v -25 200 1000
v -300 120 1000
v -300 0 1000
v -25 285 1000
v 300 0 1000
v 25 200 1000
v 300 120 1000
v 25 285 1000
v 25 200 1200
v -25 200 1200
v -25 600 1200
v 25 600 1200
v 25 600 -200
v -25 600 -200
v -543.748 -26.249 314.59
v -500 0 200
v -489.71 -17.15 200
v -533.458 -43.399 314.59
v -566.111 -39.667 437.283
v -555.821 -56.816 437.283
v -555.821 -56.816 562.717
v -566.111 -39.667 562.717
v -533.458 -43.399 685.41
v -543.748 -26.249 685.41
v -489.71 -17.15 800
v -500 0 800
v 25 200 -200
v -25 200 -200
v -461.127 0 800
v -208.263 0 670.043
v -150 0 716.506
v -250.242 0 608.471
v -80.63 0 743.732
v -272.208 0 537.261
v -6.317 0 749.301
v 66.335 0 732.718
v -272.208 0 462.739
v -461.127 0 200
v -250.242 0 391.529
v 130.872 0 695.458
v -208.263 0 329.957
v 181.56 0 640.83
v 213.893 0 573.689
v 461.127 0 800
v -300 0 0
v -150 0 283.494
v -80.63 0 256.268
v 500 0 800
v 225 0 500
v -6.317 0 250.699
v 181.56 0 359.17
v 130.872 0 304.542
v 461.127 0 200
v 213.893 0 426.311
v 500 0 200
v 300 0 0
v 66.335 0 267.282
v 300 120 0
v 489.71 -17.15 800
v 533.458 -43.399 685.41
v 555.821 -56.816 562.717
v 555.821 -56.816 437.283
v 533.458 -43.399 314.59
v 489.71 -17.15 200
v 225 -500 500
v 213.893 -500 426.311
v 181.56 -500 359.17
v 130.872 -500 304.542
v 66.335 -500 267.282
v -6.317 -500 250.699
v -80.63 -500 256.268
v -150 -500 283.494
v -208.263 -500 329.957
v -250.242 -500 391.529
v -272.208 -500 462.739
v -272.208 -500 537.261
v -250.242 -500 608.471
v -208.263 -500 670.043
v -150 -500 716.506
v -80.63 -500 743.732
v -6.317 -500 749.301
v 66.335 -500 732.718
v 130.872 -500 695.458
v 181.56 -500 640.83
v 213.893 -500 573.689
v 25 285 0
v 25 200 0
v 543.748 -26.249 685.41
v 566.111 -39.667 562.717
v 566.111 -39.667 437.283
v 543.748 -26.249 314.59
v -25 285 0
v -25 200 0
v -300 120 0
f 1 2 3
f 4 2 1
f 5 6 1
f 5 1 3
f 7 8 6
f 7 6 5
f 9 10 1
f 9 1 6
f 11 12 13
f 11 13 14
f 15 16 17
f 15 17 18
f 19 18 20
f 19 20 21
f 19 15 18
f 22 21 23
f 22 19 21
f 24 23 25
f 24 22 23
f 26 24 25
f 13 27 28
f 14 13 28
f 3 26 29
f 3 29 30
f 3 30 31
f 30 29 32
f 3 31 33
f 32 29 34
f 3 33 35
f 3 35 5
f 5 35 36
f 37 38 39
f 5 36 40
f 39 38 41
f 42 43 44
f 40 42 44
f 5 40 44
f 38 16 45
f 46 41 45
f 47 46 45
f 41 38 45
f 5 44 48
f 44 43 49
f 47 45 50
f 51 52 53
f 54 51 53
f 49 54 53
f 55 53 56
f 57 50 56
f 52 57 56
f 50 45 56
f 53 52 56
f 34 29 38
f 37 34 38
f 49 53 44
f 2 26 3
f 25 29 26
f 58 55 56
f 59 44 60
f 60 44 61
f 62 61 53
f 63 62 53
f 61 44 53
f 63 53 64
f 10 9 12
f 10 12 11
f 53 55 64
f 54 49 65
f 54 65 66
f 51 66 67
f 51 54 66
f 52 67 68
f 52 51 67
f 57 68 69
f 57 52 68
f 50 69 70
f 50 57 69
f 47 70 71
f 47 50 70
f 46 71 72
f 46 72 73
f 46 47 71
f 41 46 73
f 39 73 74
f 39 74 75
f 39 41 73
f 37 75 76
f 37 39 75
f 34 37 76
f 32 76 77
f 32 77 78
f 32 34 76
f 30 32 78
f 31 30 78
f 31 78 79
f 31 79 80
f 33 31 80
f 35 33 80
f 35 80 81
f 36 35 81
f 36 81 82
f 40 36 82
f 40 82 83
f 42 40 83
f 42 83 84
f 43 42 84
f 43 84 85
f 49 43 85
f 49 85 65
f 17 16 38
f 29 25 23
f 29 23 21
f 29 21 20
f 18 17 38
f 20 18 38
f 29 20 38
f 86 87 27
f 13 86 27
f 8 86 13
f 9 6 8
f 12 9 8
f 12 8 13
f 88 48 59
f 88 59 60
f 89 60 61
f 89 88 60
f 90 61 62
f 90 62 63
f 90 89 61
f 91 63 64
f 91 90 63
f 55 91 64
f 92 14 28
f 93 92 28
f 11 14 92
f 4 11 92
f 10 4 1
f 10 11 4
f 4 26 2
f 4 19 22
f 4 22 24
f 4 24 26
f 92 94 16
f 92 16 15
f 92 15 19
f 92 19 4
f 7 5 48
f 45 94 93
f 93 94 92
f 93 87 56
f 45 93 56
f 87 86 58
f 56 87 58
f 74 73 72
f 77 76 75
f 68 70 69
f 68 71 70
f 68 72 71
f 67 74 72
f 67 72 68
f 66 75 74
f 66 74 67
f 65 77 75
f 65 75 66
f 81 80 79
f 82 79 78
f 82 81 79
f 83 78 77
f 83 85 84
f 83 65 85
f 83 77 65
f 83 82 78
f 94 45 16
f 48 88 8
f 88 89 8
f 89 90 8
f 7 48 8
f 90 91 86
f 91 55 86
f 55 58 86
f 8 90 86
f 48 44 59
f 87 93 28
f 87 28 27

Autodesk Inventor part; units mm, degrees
ref_plane "YZ Plane" through (0, 0, 0) normal (1, 0, 0) x (0, 1, 0)
ref_plane "XZ Plane" through (0, 0, 0) normal (0, 1, 0) x (-1, 0, 0)
ref_plane "XY Plane" through (0, 0, 0) normal (0, 0, 1) x (1, 0, 0)
sketch "Boceto1" plane through (0, 0, 0) normal (0, 0, 1) x (1, 0, 0)
  line L0 (0, 0) -> (-500, 0)
  line L1 (0, 0) -> (500, 0)
  line L2 (0, 0) -> (0, 300)
  line L3 (-500, 0) -> (0, 300)
  line L4 (500, 0) -> (0, 300)
  dimension "d0" = 500
  dimension "d1" = 500
  dimension "d2" = 300
extrude "Extrusión1" add sketch "Boceto1" along normal blind 1000
sketch "Boceto2" plane through (-500, 0, 0) normal (0, -1, 0) x (1, 0, 0)
  line L0 (0, 1000) -> (1000, 1000) projected
  line L1 (0, 1000) -> (0, 800)
  line L2 (0, 0) -> (0, 1000) projected
  line L3 (0, 800) -> (200, 1000)
  line L4 (200, 1000) -> (0, 1000)
  line L5 (1000, 1000) -> (800, 1000)
  line L6 (800, 1000) -> (1000, 800)
  line L7 (1000, 0) -> (1000, 1000) projected
  line L8 (1000, 800) -> (1000, 1000)
  line L9 (0, 0) -> (1000, 0) projected
  line L10 (0, 0) -> (0, 200)
  line L11 (200, 0) -> (0, 0)
  line L12 (200, 0) -> (0, 200)
  line L13 (1000, 0) -> (800, 0)
  line L14 (800, 0) -> (1000, 0)
  line L15 (1000, 200) -> (800, 0)
  point P0 (500, 0)
  dimension "d5" = 200
  dimension "d6" = 45
  dimension "d7" = 200
  dimension "d8" = 45
extrude "Extrusión2" cut sketch "Boceto2" against normal blind 1000 contours L0 L3 L1 | L0 L7 L6 | L12 L9 L2 | L7 L9 L15
sketch "Boceto3" plane through (0, 300, 1000) normal (0.5145, 0.8575, 0) x (0.8575, -0.5145, 0)
  line L0 (583.0952, 800) -> (583.0952, 200) projected
  arc A0 (583.0952, 200) -> (583.0952, 800) centre (63.4799, 500) ccw
  line L1 (583.0952, 800) -> (473.0952, 800)
  line L2 (473.0952, 800) -> (473.0952, 200)
  line L3 (473.0952, 200) -> (583.0952, 200)
  line L4 (583.0952, 200) -> (583.0952, 800)
  point P0 (154.3487, 1000)
  dimension "d11" = 600
  dimension "d12" = 110
extrude "Extrusión3" add sketch "Boceto3" against normal blind 20
sketch "Boceto4" plane through (0, 300, 1000) normal (-0.5145, 0.8575, 0) x (0.8575, 0.5145, 0)
  line L0 (-583.0952, 800) -> (-583.0952, 200) projected
  arc A0 (-583.0952, 800) -> (-583.0952, 200) centre (-63.4799, 500) ccw
  line L1 (-583.0952, 800) -> (-473.0952, 800)
  line L2 (-473.0952, 800) -> (-473.0952, 200)
  line L3 (-473.0952, 200) -> (-583.0952, 200)
  line L4 (-583.0952, 200) -> (-583.0952, 800)
  point P0 (-154.3487, 1000)
  dimension "d15" = 600
  dimension "d16" = 110
extrude "Extrusión4" add sketch "Boceto4" against normal blind 20
sketch "Boceto5" plane through (0, 0, 0) normal (0, 0, -1) x (-1, 0, 0)
  line L0 (-300, 120) -> (0, 300) projected
  line L1 (0, 300) -> (0, 200)
  line L2 (0, 200) -> (25, 200)
  line L3 (0, 200) -> (-25, 200)
  line L4 (-25, 200) -> (-25, 600)
  line L5 (-25, 600) -> (25, 600)
  line L6 (25, 600) -> (25, 200)
  point P0 (0, 0)
  dimension "d19" = 100
  dimension "d20" = 25
  dimension "d21" = 25
  dimension "d22" = 400
extrude "Extrusión5" add sketch "Boceto5" along normal blind 200 and the other way blind 1200
sketch "Boceto6" plane through (-300, 0, 0) normal (0, -1, 0) x (1, 0, 0)
  line L0 (275, 1000) -> (275, 0) projected
  circle A0 centre (275, 500) radius 250
  point P0 (300, 0)
  dimension "d27" = 500
extrude "Extrusión6" add sketch "Boceto6" along normal blind 500
properties part number "Base_rotativa"
